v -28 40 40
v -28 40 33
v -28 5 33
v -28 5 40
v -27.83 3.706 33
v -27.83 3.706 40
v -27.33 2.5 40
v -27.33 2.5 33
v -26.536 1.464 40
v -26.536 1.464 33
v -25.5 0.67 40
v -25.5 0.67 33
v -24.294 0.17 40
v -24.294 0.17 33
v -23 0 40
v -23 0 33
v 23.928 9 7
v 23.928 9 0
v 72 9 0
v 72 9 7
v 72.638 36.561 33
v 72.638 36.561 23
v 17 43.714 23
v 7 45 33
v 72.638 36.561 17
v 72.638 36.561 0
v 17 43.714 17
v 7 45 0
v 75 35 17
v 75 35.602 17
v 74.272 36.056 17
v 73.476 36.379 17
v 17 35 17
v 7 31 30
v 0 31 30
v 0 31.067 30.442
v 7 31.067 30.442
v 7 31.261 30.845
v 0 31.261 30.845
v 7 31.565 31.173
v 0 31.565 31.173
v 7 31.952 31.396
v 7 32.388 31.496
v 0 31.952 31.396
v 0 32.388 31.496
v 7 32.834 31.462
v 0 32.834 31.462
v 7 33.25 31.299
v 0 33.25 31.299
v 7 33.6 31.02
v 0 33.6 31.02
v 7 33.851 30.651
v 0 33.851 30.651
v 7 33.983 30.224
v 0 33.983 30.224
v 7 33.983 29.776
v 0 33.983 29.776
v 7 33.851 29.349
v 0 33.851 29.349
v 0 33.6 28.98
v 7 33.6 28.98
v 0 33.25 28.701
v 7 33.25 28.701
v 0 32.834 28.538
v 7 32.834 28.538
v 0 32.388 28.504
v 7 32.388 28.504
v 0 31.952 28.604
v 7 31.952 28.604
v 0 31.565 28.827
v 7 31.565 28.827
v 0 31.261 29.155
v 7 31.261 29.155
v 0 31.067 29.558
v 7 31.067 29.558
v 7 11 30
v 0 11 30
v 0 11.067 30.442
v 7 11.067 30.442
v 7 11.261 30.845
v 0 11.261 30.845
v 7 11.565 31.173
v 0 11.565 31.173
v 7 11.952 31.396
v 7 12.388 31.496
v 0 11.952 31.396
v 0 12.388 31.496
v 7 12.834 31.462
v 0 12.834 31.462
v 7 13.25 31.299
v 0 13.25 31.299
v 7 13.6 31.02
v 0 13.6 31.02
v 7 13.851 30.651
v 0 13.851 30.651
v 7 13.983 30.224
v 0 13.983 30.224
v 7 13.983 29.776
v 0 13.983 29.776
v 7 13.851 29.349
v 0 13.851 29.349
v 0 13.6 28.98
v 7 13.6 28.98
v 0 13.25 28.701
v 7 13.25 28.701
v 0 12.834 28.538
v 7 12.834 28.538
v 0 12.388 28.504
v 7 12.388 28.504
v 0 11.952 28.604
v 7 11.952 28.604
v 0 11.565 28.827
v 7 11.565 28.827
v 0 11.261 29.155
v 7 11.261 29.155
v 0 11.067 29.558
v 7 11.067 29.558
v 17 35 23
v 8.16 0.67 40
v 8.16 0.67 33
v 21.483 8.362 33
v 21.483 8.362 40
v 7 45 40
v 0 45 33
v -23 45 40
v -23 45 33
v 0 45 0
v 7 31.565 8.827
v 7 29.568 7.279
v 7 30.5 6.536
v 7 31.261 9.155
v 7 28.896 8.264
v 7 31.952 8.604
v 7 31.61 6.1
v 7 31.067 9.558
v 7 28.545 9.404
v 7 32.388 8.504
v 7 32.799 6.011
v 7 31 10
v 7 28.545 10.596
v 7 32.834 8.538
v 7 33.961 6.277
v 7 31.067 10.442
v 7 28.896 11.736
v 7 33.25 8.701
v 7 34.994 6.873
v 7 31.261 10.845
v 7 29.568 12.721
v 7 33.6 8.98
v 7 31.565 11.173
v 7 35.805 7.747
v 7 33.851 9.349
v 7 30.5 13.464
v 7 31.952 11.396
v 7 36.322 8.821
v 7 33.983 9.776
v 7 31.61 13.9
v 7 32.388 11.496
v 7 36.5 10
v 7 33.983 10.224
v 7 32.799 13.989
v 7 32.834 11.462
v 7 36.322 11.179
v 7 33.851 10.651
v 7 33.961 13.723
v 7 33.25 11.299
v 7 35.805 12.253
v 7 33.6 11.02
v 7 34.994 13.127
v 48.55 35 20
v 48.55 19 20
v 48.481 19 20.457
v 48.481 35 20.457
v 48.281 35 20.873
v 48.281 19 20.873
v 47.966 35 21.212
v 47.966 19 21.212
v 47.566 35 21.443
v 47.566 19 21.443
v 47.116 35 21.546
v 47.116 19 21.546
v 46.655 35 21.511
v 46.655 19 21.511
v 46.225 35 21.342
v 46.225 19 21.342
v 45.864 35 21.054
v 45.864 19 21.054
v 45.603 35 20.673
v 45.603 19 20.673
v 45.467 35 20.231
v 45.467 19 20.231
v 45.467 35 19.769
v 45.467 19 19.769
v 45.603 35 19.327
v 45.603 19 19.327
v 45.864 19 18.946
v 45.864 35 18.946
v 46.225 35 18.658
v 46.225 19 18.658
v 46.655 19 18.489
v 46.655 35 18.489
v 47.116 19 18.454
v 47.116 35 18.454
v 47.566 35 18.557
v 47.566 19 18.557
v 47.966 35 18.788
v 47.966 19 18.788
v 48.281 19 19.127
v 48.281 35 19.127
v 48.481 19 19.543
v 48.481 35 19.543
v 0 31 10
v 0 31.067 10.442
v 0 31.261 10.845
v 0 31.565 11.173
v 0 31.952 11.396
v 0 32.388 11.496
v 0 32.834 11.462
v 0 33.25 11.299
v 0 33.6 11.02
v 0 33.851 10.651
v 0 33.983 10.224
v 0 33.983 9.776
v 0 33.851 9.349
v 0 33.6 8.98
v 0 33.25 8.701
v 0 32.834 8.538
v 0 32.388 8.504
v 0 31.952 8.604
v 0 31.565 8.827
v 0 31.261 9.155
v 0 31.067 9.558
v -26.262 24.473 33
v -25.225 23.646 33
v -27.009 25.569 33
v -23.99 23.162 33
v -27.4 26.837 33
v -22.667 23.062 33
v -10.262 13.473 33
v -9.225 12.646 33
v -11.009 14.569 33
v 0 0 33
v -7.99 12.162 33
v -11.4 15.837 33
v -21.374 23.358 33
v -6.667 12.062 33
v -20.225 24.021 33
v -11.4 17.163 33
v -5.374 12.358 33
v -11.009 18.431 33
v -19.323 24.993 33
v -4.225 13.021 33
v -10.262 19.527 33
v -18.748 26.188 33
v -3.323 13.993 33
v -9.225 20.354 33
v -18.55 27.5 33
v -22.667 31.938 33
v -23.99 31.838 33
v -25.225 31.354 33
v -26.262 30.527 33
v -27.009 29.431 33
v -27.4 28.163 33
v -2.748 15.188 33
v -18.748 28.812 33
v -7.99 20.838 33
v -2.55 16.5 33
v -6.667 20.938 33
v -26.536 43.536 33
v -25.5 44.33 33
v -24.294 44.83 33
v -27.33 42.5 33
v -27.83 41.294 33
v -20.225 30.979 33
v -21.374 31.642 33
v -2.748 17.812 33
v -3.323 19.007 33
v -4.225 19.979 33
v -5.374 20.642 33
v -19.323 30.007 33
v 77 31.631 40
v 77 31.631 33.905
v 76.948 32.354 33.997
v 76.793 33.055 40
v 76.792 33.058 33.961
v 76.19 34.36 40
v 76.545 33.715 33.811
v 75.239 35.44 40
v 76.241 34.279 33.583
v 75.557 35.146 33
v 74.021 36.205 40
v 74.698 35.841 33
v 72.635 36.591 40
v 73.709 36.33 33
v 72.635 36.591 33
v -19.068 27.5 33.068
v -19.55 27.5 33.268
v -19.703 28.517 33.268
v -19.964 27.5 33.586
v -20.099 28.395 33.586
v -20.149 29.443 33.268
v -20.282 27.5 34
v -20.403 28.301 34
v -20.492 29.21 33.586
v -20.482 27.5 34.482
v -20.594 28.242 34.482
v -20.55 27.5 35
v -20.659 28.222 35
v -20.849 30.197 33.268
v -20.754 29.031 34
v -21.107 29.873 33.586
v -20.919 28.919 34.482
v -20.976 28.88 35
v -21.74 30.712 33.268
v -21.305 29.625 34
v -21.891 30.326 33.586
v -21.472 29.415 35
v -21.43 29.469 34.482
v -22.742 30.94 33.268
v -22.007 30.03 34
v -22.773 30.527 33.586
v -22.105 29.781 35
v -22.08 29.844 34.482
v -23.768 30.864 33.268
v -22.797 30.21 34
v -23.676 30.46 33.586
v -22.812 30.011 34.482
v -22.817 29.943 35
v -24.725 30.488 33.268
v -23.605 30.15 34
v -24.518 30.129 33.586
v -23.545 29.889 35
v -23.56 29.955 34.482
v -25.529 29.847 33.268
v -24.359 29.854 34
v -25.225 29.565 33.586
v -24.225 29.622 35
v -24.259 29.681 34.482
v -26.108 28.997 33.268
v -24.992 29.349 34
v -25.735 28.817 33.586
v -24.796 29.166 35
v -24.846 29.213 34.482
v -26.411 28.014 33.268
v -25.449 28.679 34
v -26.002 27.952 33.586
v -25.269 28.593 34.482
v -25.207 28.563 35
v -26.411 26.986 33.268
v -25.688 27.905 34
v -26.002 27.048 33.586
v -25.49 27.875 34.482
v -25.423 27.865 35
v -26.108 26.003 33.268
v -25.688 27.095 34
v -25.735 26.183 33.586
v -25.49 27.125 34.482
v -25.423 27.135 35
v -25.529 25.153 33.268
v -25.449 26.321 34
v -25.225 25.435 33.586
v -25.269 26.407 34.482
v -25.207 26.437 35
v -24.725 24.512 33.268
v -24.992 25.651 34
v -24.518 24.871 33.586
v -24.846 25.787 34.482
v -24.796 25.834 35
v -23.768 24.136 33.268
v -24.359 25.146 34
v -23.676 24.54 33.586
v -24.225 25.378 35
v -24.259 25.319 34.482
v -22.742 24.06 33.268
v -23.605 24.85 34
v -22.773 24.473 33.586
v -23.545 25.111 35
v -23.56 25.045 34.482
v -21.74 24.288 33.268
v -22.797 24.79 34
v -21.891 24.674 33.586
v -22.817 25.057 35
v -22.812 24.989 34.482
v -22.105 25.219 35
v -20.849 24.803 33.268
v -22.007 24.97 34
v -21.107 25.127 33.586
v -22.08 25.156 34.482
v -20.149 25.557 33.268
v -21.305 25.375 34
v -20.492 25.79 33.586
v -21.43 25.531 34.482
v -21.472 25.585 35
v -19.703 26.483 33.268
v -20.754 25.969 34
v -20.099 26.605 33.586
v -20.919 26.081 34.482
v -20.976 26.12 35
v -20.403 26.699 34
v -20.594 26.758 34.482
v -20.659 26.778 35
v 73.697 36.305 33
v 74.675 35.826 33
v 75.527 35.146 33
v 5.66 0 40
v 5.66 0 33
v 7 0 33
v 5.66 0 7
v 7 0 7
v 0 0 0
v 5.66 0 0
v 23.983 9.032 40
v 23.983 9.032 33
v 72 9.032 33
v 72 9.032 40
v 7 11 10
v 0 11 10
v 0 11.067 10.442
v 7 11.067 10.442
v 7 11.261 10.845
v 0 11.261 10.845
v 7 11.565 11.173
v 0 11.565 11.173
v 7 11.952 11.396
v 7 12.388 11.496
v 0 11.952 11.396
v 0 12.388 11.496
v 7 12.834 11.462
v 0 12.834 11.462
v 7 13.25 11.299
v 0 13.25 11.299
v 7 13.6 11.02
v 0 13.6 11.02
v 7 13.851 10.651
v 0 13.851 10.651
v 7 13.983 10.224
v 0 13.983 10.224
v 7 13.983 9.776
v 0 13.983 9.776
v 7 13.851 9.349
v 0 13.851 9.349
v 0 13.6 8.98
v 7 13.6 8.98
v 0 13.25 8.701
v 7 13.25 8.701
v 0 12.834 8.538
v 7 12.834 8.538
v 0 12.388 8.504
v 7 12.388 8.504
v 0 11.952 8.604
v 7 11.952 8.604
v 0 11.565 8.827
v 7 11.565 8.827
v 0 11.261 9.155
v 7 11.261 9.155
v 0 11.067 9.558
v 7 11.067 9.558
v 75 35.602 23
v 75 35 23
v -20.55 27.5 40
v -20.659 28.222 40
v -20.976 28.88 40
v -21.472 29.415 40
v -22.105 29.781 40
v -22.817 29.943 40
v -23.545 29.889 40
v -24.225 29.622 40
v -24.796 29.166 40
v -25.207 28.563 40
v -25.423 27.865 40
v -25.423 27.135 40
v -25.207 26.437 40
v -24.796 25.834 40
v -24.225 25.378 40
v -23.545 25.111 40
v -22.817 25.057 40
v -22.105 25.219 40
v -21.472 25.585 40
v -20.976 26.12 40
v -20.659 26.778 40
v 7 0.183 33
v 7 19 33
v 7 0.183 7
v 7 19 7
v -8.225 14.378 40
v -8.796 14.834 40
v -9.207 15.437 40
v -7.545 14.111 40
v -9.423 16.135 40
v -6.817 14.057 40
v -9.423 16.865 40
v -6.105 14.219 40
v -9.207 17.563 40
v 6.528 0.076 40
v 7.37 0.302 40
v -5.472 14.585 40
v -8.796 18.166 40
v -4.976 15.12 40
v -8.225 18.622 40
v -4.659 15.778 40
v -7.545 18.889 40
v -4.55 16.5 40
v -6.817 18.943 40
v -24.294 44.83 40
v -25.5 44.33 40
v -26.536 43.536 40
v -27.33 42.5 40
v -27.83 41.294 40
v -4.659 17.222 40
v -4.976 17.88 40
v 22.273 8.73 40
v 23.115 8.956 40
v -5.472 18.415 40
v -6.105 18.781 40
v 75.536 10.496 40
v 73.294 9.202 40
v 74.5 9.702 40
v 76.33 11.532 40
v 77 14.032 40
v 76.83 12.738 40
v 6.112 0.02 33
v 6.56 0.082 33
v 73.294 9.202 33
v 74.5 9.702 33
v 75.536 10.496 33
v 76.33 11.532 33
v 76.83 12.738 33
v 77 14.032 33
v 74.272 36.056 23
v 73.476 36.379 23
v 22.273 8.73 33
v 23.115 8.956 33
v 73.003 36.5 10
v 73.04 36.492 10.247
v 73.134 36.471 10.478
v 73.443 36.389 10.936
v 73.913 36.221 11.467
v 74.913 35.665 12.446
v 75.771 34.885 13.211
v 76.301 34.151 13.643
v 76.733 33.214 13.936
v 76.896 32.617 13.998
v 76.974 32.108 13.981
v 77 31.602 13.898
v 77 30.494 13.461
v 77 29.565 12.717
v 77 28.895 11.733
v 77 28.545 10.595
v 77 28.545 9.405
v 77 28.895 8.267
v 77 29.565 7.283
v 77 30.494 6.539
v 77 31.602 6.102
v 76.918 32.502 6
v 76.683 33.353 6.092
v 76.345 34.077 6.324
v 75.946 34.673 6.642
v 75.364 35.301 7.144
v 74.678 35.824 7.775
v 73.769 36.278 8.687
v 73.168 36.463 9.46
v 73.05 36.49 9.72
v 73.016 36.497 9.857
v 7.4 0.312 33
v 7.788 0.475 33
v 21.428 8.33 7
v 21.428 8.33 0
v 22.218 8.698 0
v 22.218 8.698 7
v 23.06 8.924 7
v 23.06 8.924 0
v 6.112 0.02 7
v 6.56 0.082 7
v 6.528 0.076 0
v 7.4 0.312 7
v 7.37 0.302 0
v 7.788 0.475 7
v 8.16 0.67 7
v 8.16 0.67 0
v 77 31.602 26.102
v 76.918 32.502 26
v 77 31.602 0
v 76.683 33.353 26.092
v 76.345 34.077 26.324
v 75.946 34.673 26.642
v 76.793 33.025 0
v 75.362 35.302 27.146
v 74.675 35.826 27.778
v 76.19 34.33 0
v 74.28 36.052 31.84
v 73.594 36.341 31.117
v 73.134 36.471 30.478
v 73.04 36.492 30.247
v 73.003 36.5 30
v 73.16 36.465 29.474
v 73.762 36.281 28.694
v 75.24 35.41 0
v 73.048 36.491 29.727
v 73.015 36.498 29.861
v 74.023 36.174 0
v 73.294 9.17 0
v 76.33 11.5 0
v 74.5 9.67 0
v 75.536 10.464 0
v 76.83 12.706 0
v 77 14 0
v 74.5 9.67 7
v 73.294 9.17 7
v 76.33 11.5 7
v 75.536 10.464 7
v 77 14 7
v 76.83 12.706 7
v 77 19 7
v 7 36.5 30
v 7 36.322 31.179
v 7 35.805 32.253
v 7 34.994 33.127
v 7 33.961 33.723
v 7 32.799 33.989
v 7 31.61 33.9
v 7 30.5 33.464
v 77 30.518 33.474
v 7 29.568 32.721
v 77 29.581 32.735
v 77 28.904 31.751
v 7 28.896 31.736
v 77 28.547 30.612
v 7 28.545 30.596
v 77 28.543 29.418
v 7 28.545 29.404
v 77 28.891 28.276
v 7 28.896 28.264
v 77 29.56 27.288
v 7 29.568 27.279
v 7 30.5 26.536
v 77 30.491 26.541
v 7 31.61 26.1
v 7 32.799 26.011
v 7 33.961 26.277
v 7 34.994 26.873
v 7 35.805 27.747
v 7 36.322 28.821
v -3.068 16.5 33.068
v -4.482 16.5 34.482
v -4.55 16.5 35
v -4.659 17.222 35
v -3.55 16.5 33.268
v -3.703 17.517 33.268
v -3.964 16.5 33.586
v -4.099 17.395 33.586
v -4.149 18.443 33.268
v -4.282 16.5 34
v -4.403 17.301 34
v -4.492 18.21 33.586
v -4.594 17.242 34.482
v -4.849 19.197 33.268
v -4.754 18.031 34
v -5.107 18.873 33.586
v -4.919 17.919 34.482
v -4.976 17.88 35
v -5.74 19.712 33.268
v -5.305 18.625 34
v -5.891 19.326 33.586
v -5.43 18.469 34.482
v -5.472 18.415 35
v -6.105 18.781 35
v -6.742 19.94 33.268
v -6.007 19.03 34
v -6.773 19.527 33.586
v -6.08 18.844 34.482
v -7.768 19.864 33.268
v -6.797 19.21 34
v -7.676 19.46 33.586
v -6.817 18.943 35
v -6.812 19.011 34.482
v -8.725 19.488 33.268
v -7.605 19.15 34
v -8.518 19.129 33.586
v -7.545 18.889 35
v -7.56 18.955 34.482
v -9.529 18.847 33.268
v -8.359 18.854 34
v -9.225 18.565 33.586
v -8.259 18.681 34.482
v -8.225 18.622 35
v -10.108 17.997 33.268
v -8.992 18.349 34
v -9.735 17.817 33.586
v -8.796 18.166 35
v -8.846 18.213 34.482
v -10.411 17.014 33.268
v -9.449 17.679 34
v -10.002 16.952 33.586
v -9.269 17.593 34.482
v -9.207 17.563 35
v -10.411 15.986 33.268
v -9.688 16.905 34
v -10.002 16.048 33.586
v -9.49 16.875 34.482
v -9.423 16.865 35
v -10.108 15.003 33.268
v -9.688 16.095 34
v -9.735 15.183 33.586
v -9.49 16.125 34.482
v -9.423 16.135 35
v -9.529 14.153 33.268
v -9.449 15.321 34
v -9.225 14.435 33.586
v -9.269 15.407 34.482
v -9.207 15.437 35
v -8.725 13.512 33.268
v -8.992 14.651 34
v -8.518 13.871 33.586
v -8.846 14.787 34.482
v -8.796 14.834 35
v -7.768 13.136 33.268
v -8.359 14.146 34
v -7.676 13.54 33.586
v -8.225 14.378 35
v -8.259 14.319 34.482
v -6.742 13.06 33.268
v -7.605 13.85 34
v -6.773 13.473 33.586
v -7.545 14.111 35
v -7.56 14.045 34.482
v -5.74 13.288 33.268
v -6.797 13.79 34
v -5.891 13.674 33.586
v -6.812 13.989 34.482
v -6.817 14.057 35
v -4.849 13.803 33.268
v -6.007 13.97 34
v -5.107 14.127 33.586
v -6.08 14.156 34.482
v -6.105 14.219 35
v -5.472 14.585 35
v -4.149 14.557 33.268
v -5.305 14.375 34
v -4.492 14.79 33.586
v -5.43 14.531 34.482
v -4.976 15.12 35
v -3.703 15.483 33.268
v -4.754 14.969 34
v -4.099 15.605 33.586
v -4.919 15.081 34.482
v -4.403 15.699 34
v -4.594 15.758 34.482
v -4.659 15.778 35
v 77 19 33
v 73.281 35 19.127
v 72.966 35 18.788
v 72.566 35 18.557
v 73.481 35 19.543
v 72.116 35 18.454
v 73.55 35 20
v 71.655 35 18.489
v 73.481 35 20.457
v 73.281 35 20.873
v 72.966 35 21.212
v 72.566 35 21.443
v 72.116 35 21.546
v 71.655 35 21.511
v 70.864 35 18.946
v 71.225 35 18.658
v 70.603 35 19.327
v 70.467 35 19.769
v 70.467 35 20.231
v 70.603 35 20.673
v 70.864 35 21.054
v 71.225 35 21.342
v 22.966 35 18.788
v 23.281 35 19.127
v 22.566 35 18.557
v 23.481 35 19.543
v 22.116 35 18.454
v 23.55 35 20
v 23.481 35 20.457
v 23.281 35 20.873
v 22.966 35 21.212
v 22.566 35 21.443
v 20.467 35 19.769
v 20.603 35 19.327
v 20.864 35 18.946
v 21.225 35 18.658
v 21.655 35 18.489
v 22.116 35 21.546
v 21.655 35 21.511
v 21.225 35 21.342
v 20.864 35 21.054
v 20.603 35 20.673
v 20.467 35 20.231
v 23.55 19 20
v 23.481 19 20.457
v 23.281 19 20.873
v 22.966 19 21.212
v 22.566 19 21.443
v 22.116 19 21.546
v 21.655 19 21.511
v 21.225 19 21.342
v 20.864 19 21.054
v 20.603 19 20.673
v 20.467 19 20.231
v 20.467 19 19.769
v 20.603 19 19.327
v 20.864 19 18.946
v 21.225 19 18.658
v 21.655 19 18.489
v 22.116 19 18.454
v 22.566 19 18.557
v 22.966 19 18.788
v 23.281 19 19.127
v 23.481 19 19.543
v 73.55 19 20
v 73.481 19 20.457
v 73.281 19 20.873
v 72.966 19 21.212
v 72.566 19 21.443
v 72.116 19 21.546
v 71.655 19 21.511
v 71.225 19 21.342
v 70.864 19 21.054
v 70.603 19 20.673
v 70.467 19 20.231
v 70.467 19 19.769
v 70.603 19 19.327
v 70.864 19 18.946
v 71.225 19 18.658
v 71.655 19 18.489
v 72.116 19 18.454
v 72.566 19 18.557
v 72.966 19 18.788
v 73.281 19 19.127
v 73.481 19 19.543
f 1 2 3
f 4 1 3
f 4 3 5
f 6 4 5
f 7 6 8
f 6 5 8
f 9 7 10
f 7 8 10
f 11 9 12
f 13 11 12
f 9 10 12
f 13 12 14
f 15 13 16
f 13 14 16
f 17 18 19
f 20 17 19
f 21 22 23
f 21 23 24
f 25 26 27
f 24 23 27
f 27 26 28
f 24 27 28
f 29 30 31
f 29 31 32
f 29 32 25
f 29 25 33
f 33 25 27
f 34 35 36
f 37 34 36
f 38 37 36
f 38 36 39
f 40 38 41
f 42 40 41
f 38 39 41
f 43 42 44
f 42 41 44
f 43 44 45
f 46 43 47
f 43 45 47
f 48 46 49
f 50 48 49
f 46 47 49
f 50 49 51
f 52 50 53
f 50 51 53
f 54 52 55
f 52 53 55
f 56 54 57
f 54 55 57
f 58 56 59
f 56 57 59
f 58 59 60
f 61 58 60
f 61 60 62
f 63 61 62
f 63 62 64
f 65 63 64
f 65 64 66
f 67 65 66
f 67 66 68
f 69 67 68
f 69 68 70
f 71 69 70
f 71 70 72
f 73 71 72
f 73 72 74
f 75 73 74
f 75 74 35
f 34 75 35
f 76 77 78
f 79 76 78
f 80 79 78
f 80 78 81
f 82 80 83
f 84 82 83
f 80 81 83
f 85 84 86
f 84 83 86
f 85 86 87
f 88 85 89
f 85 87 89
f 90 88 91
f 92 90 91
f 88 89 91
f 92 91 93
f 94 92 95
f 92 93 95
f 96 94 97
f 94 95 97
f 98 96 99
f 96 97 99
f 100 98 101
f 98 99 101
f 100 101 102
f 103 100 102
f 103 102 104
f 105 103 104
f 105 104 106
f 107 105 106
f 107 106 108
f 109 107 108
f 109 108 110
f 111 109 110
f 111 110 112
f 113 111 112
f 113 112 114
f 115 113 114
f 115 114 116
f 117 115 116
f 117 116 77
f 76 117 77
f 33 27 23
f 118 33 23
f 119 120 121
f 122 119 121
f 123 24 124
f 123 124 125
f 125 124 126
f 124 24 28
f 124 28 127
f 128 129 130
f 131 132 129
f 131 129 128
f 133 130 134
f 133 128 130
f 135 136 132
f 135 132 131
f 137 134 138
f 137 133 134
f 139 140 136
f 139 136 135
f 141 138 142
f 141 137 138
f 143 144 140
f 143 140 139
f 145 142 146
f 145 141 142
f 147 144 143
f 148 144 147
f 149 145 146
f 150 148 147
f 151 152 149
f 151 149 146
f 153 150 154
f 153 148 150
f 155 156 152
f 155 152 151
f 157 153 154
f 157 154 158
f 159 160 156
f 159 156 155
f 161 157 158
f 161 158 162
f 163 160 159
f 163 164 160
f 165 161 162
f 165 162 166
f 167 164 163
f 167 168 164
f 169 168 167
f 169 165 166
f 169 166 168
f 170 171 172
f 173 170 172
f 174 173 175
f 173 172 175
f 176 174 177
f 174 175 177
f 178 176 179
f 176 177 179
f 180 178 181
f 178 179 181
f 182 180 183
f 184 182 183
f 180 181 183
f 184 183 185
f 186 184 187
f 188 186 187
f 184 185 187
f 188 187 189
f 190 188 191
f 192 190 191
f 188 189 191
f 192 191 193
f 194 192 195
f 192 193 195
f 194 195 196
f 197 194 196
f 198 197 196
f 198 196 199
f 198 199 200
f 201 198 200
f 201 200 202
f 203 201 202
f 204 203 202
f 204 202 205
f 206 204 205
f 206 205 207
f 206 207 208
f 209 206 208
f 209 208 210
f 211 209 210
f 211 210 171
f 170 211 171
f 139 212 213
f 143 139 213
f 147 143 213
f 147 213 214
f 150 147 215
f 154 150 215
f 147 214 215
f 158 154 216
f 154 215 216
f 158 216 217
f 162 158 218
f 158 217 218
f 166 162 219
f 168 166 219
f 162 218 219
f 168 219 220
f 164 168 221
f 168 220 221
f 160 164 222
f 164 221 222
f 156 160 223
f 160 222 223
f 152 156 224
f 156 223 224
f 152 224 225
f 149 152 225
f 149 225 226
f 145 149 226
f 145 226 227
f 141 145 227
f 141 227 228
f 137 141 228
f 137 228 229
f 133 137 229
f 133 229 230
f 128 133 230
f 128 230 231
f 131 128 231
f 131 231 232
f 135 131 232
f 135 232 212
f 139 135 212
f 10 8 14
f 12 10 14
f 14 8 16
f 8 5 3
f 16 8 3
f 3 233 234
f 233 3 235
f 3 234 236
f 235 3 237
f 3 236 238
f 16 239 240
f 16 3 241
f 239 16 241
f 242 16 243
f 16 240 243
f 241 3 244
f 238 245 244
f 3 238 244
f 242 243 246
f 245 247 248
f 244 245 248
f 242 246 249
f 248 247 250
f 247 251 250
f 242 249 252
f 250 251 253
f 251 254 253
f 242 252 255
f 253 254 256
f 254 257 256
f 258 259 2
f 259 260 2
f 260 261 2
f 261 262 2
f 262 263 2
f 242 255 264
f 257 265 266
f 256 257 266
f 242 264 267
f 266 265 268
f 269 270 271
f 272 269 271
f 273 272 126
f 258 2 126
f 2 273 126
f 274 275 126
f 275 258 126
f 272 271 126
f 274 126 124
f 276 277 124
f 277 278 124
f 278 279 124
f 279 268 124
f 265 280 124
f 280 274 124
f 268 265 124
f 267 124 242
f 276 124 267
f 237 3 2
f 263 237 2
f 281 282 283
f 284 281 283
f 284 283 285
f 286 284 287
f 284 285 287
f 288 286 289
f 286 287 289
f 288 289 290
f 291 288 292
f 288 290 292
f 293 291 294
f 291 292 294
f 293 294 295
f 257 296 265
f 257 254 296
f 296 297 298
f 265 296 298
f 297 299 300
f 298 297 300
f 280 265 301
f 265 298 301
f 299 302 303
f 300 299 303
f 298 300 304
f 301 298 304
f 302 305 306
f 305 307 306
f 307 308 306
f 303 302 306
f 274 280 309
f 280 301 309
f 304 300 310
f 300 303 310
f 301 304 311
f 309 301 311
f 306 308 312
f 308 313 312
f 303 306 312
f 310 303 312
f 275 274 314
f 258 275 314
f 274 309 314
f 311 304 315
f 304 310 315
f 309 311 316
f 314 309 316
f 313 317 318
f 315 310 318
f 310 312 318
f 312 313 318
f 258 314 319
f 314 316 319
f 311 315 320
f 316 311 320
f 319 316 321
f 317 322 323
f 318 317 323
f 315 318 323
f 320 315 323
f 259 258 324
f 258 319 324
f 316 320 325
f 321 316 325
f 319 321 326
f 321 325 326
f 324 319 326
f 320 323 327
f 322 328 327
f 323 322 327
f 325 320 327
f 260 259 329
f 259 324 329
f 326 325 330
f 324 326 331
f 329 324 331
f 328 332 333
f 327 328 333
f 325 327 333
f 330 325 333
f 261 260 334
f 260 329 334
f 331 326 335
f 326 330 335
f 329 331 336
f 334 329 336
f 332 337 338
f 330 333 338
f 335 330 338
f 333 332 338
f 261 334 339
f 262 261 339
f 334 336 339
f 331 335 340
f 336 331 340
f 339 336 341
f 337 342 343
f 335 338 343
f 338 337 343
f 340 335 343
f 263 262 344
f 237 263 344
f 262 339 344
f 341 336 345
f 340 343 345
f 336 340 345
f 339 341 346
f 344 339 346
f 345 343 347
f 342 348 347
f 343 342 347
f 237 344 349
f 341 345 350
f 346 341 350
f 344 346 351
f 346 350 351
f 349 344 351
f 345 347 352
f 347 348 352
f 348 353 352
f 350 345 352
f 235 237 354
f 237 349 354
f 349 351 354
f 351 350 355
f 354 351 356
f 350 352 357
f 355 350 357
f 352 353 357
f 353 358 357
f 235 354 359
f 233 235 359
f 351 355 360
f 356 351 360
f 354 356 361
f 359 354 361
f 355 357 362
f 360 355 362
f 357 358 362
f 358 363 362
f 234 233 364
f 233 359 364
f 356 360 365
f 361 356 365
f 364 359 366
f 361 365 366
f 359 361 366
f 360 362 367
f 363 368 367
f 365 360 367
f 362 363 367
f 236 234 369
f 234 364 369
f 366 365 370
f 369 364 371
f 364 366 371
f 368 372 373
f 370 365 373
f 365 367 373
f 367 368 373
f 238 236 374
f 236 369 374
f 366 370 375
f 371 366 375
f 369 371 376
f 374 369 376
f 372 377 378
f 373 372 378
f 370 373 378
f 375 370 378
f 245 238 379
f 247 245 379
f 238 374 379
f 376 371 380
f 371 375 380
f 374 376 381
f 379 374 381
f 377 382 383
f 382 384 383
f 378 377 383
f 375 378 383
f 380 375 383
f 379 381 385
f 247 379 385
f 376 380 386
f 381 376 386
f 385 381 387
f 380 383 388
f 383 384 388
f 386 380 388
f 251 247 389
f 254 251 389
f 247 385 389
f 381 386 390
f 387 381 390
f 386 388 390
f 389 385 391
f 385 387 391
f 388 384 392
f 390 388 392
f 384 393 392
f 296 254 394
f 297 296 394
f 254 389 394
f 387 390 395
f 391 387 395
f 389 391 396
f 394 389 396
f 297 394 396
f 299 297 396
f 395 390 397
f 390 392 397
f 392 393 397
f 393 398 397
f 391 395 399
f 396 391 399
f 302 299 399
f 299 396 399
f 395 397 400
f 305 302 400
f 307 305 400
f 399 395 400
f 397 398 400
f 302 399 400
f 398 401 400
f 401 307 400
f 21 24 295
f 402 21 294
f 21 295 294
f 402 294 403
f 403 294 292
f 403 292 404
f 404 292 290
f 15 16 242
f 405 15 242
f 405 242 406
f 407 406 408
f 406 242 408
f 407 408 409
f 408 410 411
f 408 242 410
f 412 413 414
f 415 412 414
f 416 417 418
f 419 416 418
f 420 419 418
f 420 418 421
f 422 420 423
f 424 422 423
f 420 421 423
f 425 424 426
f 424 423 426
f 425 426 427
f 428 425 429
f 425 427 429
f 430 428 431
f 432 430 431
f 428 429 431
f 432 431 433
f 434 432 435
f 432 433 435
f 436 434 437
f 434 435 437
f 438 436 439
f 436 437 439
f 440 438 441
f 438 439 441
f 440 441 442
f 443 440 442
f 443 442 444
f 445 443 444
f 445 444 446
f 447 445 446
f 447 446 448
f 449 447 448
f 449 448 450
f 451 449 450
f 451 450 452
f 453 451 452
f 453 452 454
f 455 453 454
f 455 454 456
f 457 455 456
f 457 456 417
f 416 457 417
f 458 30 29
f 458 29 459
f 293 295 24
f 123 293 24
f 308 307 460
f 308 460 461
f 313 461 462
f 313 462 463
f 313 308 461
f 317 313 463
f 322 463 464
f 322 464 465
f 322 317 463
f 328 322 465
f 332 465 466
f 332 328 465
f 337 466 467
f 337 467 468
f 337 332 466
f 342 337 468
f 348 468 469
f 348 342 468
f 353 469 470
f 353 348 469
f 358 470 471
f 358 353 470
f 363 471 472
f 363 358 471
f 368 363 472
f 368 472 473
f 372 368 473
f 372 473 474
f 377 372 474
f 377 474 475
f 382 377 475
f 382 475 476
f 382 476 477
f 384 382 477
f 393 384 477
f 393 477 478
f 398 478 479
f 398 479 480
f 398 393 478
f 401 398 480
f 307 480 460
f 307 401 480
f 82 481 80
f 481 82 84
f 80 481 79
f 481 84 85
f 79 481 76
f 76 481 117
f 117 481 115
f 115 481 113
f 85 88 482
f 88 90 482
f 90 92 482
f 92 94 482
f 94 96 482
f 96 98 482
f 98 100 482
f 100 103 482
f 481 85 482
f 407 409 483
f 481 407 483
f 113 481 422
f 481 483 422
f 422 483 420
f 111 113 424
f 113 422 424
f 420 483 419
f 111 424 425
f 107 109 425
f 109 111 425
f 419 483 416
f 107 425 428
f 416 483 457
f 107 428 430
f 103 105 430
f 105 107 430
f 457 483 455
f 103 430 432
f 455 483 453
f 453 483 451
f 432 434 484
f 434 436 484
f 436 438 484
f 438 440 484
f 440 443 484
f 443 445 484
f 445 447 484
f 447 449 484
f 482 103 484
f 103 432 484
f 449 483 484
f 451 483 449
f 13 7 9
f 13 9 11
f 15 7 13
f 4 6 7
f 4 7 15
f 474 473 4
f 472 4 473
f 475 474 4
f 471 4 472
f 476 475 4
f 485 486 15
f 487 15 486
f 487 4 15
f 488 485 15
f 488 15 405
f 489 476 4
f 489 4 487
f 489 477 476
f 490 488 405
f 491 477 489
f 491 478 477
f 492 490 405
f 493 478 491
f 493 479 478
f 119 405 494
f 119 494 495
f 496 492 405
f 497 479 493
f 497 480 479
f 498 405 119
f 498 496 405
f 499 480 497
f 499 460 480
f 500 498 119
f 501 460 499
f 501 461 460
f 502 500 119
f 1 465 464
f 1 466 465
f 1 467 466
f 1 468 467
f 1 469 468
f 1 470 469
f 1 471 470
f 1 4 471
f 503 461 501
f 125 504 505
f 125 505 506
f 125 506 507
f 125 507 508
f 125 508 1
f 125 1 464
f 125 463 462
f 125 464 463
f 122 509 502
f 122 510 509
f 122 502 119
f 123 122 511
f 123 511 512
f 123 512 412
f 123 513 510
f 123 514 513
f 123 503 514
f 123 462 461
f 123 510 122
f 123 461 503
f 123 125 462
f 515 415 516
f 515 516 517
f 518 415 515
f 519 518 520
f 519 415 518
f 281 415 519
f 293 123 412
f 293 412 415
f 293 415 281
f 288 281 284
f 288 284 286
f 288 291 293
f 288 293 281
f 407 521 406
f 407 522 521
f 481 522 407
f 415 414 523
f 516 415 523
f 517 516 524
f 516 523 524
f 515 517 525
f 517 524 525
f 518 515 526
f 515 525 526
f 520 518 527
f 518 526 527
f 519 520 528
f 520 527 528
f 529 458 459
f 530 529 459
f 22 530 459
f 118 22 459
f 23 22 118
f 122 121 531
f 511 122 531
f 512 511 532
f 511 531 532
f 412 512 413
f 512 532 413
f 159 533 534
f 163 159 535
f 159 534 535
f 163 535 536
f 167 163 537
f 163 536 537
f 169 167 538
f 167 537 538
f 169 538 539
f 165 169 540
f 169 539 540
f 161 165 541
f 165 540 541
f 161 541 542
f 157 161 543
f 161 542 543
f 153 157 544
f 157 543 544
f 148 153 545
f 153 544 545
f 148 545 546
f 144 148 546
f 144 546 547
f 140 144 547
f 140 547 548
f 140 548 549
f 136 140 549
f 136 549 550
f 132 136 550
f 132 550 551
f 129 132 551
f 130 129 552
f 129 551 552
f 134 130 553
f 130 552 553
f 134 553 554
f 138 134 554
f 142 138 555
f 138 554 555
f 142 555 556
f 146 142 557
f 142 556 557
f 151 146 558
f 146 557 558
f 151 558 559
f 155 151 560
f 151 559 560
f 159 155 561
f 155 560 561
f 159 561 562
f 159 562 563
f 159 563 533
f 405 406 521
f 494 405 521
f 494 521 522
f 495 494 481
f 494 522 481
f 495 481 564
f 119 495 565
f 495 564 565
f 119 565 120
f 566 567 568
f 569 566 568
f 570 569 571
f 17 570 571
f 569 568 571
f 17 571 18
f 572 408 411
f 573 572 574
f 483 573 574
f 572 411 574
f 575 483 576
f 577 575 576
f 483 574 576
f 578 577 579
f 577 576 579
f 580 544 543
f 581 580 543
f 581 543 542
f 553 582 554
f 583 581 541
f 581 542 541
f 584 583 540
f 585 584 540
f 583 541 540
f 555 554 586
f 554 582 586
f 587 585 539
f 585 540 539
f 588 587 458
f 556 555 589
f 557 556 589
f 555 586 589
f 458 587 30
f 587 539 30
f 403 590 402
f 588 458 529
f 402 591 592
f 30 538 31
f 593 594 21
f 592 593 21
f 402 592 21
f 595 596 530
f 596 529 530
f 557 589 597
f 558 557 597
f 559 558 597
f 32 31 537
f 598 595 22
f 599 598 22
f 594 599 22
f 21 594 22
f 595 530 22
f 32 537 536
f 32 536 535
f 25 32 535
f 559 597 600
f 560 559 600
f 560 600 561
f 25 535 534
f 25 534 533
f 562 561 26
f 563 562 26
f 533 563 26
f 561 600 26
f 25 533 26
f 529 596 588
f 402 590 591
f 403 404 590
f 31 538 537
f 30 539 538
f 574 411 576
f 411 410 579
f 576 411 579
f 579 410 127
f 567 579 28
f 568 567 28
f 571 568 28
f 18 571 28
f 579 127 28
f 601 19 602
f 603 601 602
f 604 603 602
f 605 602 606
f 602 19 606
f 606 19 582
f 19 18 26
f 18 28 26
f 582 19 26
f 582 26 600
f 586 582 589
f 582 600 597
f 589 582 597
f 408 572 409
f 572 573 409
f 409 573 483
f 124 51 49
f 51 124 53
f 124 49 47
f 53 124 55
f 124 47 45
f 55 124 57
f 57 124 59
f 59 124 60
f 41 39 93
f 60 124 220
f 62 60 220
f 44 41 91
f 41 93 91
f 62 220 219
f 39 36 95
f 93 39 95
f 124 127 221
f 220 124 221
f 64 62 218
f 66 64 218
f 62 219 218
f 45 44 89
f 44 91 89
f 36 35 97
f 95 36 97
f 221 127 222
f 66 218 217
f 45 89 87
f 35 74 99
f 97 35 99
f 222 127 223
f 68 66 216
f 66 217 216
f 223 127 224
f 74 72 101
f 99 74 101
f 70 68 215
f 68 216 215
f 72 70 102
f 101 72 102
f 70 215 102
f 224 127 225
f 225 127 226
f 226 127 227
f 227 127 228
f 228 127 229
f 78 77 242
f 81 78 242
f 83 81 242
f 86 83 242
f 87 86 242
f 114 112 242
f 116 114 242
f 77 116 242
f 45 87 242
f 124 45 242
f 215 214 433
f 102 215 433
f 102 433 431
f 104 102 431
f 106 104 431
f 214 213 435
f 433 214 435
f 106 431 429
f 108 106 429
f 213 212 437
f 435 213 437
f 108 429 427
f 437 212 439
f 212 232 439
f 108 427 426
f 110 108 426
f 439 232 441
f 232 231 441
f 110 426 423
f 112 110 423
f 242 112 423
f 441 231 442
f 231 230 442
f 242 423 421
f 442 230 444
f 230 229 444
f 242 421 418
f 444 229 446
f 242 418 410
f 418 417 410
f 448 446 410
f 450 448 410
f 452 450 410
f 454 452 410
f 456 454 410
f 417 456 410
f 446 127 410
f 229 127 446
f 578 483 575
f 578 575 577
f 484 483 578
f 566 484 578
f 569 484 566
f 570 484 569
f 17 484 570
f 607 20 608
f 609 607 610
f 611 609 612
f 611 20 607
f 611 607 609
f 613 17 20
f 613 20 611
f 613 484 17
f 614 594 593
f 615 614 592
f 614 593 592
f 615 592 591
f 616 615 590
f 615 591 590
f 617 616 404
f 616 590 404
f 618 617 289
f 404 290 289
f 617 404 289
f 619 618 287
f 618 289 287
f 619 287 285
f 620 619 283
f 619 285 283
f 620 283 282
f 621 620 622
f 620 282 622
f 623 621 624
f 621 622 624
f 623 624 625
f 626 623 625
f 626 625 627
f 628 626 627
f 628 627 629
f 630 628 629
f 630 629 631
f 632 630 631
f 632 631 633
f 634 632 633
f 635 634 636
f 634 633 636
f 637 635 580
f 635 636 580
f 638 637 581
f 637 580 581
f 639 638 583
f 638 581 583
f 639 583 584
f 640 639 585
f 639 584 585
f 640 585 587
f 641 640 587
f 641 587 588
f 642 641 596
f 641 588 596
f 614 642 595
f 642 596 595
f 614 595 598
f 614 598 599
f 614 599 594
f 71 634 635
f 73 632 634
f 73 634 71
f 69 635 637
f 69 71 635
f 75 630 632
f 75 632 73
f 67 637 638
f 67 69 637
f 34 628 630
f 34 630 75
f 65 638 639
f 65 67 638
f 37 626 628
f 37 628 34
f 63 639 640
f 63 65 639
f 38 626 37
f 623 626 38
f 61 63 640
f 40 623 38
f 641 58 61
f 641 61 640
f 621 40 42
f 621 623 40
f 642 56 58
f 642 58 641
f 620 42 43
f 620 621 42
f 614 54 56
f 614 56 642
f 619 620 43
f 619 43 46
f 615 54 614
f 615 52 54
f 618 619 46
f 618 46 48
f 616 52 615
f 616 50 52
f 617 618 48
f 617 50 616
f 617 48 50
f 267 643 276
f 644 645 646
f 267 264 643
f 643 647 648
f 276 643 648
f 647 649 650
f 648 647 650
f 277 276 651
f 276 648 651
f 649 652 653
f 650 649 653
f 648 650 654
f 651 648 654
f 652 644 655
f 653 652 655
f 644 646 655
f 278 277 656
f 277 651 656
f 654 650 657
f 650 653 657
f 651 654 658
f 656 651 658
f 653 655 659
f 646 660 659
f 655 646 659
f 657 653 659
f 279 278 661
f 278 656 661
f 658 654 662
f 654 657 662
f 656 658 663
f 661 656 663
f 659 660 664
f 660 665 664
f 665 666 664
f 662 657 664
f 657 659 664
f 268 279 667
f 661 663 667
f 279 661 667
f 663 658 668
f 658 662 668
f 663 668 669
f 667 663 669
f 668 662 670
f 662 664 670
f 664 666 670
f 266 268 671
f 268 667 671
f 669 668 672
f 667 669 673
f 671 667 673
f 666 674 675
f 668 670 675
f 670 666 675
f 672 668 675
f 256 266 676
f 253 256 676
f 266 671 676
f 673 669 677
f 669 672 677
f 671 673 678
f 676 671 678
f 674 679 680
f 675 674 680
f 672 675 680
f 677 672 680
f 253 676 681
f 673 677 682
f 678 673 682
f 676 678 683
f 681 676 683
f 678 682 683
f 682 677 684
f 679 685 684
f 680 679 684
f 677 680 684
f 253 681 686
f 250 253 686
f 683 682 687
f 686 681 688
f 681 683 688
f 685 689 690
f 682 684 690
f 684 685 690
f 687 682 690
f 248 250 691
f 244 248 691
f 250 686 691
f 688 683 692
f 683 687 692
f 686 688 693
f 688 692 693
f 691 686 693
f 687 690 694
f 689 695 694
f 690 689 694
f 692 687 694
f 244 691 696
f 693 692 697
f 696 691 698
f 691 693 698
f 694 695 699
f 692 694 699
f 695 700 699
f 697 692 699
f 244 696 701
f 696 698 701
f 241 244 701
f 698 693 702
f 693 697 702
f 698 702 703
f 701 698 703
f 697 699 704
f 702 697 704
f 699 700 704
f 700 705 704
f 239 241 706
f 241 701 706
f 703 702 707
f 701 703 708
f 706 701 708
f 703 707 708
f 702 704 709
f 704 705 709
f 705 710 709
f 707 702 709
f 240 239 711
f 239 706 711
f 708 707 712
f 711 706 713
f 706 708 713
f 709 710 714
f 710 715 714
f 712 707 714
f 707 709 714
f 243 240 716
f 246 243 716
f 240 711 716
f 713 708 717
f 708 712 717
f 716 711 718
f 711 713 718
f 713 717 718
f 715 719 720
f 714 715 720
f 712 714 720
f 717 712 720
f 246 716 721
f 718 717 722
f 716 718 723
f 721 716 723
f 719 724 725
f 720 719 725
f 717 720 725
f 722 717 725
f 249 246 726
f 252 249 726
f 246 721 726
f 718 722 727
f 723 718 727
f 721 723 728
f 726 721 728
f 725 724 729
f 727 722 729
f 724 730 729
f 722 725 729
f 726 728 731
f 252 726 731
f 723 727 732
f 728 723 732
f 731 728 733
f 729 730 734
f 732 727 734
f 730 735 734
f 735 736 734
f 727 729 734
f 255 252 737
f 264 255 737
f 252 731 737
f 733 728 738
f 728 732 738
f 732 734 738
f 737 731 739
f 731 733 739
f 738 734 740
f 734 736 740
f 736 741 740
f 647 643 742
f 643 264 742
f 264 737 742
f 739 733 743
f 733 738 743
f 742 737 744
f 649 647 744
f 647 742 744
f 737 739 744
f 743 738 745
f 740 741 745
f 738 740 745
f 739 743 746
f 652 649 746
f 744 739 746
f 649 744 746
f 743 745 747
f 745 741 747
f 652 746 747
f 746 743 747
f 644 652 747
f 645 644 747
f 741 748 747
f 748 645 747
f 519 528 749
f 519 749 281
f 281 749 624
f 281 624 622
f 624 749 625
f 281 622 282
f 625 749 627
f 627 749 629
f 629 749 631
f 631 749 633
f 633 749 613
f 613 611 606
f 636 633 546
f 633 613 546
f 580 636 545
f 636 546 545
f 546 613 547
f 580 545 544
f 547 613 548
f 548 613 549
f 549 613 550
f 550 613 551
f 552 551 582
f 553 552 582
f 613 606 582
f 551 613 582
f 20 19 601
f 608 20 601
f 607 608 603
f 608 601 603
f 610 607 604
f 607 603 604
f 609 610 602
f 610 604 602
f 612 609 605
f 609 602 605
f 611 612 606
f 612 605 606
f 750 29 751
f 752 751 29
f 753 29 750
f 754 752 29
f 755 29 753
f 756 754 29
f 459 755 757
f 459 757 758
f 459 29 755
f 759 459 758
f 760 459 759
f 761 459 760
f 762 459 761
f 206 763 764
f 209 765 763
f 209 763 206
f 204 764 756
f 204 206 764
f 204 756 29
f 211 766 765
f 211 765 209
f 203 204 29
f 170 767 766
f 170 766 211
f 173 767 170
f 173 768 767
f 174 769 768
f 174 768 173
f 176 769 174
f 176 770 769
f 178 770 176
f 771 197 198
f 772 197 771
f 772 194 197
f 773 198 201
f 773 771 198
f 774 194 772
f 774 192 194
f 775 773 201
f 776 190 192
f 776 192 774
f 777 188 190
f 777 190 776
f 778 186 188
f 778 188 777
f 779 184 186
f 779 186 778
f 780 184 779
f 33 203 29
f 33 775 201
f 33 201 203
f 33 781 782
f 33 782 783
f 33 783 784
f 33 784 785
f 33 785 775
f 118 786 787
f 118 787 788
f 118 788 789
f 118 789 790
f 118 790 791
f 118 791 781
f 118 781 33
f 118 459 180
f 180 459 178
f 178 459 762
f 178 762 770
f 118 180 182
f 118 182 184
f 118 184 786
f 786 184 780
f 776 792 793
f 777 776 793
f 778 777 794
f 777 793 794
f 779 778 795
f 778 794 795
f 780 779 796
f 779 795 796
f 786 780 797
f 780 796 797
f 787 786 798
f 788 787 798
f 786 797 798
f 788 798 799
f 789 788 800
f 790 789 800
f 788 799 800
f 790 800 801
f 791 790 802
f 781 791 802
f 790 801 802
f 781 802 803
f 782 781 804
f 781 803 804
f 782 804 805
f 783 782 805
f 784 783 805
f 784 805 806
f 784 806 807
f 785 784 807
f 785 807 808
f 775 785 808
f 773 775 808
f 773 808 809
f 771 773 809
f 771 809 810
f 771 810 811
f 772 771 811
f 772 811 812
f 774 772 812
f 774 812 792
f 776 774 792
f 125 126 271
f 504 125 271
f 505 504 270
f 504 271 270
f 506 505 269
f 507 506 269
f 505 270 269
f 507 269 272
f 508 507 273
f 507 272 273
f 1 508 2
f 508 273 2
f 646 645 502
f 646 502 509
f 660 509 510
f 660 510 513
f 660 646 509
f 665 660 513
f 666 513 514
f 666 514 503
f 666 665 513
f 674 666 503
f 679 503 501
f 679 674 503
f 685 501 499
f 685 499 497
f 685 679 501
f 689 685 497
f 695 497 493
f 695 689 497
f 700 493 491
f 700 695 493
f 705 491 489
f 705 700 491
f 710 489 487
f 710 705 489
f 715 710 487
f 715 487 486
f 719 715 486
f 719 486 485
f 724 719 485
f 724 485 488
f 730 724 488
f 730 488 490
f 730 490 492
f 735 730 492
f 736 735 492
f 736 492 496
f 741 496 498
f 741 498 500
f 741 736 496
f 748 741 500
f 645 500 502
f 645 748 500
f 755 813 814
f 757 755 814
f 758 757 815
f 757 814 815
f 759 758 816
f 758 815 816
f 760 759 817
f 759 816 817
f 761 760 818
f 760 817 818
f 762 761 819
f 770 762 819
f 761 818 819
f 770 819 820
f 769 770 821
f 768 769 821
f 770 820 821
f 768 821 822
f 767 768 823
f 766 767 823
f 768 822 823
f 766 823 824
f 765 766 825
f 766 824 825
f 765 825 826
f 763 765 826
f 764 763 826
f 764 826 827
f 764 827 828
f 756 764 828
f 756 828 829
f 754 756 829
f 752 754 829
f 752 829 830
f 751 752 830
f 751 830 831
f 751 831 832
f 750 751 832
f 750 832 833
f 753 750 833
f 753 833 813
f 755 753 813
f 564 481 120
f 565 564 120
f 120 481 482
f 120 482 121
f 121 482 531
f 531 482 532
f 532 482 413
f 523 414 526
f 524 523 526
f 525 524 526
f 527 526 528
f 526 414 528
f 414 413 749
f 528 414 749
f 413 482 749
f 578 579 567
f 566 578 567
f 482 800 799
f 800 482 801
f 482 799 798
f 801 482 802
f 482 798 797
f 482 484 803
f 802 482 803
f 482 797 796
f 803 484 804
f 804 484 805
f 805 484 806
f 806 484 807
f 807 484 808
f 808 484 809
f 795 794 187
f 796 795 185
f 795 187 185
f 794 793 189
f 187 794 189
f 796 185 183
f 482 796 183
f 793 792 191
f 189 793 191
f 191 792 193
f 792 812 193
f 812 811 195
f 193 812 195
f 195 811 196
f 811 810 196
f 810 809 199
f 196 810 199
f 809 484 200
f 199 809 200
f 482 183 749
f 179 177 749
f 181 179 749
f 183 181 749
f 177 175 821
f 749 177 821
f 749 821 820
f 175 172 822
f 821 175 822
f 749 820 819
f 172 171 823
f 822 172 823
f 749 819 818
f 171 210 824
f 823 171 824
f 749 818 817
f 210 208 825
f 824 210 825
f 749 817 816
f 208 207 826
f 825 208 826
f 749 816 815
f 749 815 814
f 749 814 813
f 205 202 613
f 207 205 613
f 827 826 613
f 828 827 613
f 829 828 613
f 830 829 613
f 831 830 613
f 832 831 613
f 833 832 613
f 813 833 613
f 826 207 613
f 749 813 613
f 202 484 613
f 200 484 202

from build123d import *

# Parameters (mm, degrees)
F1_DEPTH  = 7
F3_DEPTH  = 26
F4_R      = 2.45
F5_DEPTH  = 7
F6_R      = 2
F7_R      = 1.5
F8_DEPTH  = 77.001
F9_R      = 4
F10_DEPTH = 70
F11_R     = 1.55
F12_DEPTH = 26.001
F13_W     = 58
F13_H     = 6
F14_DEPTH = 10


with BuildPart() as f1:
    # F0 (on Top) → F1 (new body)
    with BuildSketch(Plane.XY):
        with BuildLine():
            Line((0, 45), (0, 0))
            Line((0, 0), (5.660254, 0))
            ThreePointArc((5.660254, 0), (6.954349, 0.170371), (8.160254, 0.669873))
            Line((8.160254, 0.669873), (21.428203, 8.330127))
            ThreePointArc((21.428203, 8.330127), (22.634108, 8.829629), (23.928203, 9))
            Line((23.928203, 9), (72, 9))
            ThreePointArc((72, 9), (75.535534, 10.464466), (77, 14))
            Line((77, 14), (77, 31.6017))
            ThreePointArc((77, 31.6017), (75.754201, 34.90412), (72.637609, 36.560879))
            Line((72.637609, 36.560879), (7, 45))
            Line((7, 45), (0, 45))
        make_face()
    extrude(amount=F1_DEPTH)

    # F2 (on face) → F3 (join)
    with BuildSketch(Plane.XY.offset(7)):
        with BuildLine():
            Line((0, 45), (0, 0))
            Line((0, 0), (7, 0))
            Line((7, 0), (7, 19))
            Line((7, 19), (77, 19))
            Line((77, 19), (77, 31.6017))
            ThreePointArc((77, 31.6017), (75.754201, 34.90412), (72.637609, 36.560879))
            Line((72.637609, 36.560879), (7, 45))
            Line((7, 45), (0, 45))
        make_face()
    extrude(amount=F3_DEPTH)

    # F4 (on face) → F5 (join)
    with BuildSketch(Plane.XY.offset(33)):
        with BuildLine():
            Line((0, 45), (0, 0))
            Line((0, 0), (5.660254, 0))
            ThreePointArc((5.660254, 0), (6.954349, 0.170371), (8.160254, 0.669873))
            Line((8.160254, 0.669873), (21.483041, 8.361788))
            ThreePointArc((21.483041, 8.361788), (22.688946, 8.86129), (23.983041, 9.03166))
            Line((23.983041, 9.03166), (72, 9.03166))
            ThreePointArc((72, 9.03166), (75.535534, 10.496127), (77, 14.03166))
            Line((77, 14.03166), (77, 31.631387))
            ThreePointArc((77, 31.631387), (75.753466, 34.934642), (72.635402, 36.590849))
            Line((72.635402, 36.590849), (7, 45))
            Line((7, 45), (0, 45))
        make_face()
        with BuildLine():
            Line((-23, 0), (0, 0))
            Line((0, 0), (0, 45))
            Line((0, 45), (-23, 45))
            ThreePointArc((-23, 45), (-26.535534, 43.535534), (-28, 40))
            Line((-28, 40), (-28, 5))
            ThreePointArc((-28, 5), (-26.535534, 1.464466), (-23, 0))
        make_face()
        with Locations((-7, 16.5)):
            Circle(F4_R, mode=Mode.SUBTRACT)
        with Locations((-23, 27.5)):
            Circle(F4_R, mode=Mode.SUBTRACT)
    extrude(amount=F5_DEPTH)

    # F6
    f6_edges = [f1.edges().sort_by_distance(p)[0] for p in [
        (-9.45, 16.5, 33),
        (-25.45, 27.5, 33),
    ]]
    fillet(f6_edges, radius=F6_R)

    # F7 (on face) → F8 (cut, through all)
    with BuildSketch(Plane(origin=(0, 0, 0), x_dir=(0, -1, 0), z_dir=(-1, 0, 0))):
        with Locations((-32.5, 30)):
            Circle(F7_R)
        with Locations((-12.5, 30)):
            Circle(F7_R)
        with Locations((-12.5, 10)):
            Circle(F7_R)
        with Locations((-32.5, 10)):
            Circle(F7_R)
    extrude(amount=-F8_DEPTH, mode=Mode.SUBTRACT)

    # F9 (on face) → F10 (cut)
    with BuildSketch(Plane.YZ.offset(77)):
        with Locations((32.5, 30)):
            Circle(F9_R)
        with Locations((32.5, 10)):
            Circle(F9_R)
    extrude(amount=-F10_DEPTH, mode=Mode.SUBTRACT)

    # F11 (on face) → F12 (cut, through all)
    with BuildSketch(Plane.XZ.offset(-19)):
        with Locations((22, 20)):
            Circle(F11_R)
        with Locations((47, 20)):
            Circle(F11_R)
        with Locations((72, 20)):
            Circle(F11_R)
    extrude(amount=-F12_DEPTH, mode=Mode.SUBTRACT)

    # F13 (on face) → F14 (cut)
    with BuildSketch(Plane(origin=(0, 45, 0), x_dir=(-1, 0, 0), z_dir=(0, 1, 0))):
        with Locations((-46, 20)):
            Rectangle(F13_W, F13_H)
    extrude(amount=-F14_DEPTH, mode=Mode.SUBTRACT)


solid = f1.part
